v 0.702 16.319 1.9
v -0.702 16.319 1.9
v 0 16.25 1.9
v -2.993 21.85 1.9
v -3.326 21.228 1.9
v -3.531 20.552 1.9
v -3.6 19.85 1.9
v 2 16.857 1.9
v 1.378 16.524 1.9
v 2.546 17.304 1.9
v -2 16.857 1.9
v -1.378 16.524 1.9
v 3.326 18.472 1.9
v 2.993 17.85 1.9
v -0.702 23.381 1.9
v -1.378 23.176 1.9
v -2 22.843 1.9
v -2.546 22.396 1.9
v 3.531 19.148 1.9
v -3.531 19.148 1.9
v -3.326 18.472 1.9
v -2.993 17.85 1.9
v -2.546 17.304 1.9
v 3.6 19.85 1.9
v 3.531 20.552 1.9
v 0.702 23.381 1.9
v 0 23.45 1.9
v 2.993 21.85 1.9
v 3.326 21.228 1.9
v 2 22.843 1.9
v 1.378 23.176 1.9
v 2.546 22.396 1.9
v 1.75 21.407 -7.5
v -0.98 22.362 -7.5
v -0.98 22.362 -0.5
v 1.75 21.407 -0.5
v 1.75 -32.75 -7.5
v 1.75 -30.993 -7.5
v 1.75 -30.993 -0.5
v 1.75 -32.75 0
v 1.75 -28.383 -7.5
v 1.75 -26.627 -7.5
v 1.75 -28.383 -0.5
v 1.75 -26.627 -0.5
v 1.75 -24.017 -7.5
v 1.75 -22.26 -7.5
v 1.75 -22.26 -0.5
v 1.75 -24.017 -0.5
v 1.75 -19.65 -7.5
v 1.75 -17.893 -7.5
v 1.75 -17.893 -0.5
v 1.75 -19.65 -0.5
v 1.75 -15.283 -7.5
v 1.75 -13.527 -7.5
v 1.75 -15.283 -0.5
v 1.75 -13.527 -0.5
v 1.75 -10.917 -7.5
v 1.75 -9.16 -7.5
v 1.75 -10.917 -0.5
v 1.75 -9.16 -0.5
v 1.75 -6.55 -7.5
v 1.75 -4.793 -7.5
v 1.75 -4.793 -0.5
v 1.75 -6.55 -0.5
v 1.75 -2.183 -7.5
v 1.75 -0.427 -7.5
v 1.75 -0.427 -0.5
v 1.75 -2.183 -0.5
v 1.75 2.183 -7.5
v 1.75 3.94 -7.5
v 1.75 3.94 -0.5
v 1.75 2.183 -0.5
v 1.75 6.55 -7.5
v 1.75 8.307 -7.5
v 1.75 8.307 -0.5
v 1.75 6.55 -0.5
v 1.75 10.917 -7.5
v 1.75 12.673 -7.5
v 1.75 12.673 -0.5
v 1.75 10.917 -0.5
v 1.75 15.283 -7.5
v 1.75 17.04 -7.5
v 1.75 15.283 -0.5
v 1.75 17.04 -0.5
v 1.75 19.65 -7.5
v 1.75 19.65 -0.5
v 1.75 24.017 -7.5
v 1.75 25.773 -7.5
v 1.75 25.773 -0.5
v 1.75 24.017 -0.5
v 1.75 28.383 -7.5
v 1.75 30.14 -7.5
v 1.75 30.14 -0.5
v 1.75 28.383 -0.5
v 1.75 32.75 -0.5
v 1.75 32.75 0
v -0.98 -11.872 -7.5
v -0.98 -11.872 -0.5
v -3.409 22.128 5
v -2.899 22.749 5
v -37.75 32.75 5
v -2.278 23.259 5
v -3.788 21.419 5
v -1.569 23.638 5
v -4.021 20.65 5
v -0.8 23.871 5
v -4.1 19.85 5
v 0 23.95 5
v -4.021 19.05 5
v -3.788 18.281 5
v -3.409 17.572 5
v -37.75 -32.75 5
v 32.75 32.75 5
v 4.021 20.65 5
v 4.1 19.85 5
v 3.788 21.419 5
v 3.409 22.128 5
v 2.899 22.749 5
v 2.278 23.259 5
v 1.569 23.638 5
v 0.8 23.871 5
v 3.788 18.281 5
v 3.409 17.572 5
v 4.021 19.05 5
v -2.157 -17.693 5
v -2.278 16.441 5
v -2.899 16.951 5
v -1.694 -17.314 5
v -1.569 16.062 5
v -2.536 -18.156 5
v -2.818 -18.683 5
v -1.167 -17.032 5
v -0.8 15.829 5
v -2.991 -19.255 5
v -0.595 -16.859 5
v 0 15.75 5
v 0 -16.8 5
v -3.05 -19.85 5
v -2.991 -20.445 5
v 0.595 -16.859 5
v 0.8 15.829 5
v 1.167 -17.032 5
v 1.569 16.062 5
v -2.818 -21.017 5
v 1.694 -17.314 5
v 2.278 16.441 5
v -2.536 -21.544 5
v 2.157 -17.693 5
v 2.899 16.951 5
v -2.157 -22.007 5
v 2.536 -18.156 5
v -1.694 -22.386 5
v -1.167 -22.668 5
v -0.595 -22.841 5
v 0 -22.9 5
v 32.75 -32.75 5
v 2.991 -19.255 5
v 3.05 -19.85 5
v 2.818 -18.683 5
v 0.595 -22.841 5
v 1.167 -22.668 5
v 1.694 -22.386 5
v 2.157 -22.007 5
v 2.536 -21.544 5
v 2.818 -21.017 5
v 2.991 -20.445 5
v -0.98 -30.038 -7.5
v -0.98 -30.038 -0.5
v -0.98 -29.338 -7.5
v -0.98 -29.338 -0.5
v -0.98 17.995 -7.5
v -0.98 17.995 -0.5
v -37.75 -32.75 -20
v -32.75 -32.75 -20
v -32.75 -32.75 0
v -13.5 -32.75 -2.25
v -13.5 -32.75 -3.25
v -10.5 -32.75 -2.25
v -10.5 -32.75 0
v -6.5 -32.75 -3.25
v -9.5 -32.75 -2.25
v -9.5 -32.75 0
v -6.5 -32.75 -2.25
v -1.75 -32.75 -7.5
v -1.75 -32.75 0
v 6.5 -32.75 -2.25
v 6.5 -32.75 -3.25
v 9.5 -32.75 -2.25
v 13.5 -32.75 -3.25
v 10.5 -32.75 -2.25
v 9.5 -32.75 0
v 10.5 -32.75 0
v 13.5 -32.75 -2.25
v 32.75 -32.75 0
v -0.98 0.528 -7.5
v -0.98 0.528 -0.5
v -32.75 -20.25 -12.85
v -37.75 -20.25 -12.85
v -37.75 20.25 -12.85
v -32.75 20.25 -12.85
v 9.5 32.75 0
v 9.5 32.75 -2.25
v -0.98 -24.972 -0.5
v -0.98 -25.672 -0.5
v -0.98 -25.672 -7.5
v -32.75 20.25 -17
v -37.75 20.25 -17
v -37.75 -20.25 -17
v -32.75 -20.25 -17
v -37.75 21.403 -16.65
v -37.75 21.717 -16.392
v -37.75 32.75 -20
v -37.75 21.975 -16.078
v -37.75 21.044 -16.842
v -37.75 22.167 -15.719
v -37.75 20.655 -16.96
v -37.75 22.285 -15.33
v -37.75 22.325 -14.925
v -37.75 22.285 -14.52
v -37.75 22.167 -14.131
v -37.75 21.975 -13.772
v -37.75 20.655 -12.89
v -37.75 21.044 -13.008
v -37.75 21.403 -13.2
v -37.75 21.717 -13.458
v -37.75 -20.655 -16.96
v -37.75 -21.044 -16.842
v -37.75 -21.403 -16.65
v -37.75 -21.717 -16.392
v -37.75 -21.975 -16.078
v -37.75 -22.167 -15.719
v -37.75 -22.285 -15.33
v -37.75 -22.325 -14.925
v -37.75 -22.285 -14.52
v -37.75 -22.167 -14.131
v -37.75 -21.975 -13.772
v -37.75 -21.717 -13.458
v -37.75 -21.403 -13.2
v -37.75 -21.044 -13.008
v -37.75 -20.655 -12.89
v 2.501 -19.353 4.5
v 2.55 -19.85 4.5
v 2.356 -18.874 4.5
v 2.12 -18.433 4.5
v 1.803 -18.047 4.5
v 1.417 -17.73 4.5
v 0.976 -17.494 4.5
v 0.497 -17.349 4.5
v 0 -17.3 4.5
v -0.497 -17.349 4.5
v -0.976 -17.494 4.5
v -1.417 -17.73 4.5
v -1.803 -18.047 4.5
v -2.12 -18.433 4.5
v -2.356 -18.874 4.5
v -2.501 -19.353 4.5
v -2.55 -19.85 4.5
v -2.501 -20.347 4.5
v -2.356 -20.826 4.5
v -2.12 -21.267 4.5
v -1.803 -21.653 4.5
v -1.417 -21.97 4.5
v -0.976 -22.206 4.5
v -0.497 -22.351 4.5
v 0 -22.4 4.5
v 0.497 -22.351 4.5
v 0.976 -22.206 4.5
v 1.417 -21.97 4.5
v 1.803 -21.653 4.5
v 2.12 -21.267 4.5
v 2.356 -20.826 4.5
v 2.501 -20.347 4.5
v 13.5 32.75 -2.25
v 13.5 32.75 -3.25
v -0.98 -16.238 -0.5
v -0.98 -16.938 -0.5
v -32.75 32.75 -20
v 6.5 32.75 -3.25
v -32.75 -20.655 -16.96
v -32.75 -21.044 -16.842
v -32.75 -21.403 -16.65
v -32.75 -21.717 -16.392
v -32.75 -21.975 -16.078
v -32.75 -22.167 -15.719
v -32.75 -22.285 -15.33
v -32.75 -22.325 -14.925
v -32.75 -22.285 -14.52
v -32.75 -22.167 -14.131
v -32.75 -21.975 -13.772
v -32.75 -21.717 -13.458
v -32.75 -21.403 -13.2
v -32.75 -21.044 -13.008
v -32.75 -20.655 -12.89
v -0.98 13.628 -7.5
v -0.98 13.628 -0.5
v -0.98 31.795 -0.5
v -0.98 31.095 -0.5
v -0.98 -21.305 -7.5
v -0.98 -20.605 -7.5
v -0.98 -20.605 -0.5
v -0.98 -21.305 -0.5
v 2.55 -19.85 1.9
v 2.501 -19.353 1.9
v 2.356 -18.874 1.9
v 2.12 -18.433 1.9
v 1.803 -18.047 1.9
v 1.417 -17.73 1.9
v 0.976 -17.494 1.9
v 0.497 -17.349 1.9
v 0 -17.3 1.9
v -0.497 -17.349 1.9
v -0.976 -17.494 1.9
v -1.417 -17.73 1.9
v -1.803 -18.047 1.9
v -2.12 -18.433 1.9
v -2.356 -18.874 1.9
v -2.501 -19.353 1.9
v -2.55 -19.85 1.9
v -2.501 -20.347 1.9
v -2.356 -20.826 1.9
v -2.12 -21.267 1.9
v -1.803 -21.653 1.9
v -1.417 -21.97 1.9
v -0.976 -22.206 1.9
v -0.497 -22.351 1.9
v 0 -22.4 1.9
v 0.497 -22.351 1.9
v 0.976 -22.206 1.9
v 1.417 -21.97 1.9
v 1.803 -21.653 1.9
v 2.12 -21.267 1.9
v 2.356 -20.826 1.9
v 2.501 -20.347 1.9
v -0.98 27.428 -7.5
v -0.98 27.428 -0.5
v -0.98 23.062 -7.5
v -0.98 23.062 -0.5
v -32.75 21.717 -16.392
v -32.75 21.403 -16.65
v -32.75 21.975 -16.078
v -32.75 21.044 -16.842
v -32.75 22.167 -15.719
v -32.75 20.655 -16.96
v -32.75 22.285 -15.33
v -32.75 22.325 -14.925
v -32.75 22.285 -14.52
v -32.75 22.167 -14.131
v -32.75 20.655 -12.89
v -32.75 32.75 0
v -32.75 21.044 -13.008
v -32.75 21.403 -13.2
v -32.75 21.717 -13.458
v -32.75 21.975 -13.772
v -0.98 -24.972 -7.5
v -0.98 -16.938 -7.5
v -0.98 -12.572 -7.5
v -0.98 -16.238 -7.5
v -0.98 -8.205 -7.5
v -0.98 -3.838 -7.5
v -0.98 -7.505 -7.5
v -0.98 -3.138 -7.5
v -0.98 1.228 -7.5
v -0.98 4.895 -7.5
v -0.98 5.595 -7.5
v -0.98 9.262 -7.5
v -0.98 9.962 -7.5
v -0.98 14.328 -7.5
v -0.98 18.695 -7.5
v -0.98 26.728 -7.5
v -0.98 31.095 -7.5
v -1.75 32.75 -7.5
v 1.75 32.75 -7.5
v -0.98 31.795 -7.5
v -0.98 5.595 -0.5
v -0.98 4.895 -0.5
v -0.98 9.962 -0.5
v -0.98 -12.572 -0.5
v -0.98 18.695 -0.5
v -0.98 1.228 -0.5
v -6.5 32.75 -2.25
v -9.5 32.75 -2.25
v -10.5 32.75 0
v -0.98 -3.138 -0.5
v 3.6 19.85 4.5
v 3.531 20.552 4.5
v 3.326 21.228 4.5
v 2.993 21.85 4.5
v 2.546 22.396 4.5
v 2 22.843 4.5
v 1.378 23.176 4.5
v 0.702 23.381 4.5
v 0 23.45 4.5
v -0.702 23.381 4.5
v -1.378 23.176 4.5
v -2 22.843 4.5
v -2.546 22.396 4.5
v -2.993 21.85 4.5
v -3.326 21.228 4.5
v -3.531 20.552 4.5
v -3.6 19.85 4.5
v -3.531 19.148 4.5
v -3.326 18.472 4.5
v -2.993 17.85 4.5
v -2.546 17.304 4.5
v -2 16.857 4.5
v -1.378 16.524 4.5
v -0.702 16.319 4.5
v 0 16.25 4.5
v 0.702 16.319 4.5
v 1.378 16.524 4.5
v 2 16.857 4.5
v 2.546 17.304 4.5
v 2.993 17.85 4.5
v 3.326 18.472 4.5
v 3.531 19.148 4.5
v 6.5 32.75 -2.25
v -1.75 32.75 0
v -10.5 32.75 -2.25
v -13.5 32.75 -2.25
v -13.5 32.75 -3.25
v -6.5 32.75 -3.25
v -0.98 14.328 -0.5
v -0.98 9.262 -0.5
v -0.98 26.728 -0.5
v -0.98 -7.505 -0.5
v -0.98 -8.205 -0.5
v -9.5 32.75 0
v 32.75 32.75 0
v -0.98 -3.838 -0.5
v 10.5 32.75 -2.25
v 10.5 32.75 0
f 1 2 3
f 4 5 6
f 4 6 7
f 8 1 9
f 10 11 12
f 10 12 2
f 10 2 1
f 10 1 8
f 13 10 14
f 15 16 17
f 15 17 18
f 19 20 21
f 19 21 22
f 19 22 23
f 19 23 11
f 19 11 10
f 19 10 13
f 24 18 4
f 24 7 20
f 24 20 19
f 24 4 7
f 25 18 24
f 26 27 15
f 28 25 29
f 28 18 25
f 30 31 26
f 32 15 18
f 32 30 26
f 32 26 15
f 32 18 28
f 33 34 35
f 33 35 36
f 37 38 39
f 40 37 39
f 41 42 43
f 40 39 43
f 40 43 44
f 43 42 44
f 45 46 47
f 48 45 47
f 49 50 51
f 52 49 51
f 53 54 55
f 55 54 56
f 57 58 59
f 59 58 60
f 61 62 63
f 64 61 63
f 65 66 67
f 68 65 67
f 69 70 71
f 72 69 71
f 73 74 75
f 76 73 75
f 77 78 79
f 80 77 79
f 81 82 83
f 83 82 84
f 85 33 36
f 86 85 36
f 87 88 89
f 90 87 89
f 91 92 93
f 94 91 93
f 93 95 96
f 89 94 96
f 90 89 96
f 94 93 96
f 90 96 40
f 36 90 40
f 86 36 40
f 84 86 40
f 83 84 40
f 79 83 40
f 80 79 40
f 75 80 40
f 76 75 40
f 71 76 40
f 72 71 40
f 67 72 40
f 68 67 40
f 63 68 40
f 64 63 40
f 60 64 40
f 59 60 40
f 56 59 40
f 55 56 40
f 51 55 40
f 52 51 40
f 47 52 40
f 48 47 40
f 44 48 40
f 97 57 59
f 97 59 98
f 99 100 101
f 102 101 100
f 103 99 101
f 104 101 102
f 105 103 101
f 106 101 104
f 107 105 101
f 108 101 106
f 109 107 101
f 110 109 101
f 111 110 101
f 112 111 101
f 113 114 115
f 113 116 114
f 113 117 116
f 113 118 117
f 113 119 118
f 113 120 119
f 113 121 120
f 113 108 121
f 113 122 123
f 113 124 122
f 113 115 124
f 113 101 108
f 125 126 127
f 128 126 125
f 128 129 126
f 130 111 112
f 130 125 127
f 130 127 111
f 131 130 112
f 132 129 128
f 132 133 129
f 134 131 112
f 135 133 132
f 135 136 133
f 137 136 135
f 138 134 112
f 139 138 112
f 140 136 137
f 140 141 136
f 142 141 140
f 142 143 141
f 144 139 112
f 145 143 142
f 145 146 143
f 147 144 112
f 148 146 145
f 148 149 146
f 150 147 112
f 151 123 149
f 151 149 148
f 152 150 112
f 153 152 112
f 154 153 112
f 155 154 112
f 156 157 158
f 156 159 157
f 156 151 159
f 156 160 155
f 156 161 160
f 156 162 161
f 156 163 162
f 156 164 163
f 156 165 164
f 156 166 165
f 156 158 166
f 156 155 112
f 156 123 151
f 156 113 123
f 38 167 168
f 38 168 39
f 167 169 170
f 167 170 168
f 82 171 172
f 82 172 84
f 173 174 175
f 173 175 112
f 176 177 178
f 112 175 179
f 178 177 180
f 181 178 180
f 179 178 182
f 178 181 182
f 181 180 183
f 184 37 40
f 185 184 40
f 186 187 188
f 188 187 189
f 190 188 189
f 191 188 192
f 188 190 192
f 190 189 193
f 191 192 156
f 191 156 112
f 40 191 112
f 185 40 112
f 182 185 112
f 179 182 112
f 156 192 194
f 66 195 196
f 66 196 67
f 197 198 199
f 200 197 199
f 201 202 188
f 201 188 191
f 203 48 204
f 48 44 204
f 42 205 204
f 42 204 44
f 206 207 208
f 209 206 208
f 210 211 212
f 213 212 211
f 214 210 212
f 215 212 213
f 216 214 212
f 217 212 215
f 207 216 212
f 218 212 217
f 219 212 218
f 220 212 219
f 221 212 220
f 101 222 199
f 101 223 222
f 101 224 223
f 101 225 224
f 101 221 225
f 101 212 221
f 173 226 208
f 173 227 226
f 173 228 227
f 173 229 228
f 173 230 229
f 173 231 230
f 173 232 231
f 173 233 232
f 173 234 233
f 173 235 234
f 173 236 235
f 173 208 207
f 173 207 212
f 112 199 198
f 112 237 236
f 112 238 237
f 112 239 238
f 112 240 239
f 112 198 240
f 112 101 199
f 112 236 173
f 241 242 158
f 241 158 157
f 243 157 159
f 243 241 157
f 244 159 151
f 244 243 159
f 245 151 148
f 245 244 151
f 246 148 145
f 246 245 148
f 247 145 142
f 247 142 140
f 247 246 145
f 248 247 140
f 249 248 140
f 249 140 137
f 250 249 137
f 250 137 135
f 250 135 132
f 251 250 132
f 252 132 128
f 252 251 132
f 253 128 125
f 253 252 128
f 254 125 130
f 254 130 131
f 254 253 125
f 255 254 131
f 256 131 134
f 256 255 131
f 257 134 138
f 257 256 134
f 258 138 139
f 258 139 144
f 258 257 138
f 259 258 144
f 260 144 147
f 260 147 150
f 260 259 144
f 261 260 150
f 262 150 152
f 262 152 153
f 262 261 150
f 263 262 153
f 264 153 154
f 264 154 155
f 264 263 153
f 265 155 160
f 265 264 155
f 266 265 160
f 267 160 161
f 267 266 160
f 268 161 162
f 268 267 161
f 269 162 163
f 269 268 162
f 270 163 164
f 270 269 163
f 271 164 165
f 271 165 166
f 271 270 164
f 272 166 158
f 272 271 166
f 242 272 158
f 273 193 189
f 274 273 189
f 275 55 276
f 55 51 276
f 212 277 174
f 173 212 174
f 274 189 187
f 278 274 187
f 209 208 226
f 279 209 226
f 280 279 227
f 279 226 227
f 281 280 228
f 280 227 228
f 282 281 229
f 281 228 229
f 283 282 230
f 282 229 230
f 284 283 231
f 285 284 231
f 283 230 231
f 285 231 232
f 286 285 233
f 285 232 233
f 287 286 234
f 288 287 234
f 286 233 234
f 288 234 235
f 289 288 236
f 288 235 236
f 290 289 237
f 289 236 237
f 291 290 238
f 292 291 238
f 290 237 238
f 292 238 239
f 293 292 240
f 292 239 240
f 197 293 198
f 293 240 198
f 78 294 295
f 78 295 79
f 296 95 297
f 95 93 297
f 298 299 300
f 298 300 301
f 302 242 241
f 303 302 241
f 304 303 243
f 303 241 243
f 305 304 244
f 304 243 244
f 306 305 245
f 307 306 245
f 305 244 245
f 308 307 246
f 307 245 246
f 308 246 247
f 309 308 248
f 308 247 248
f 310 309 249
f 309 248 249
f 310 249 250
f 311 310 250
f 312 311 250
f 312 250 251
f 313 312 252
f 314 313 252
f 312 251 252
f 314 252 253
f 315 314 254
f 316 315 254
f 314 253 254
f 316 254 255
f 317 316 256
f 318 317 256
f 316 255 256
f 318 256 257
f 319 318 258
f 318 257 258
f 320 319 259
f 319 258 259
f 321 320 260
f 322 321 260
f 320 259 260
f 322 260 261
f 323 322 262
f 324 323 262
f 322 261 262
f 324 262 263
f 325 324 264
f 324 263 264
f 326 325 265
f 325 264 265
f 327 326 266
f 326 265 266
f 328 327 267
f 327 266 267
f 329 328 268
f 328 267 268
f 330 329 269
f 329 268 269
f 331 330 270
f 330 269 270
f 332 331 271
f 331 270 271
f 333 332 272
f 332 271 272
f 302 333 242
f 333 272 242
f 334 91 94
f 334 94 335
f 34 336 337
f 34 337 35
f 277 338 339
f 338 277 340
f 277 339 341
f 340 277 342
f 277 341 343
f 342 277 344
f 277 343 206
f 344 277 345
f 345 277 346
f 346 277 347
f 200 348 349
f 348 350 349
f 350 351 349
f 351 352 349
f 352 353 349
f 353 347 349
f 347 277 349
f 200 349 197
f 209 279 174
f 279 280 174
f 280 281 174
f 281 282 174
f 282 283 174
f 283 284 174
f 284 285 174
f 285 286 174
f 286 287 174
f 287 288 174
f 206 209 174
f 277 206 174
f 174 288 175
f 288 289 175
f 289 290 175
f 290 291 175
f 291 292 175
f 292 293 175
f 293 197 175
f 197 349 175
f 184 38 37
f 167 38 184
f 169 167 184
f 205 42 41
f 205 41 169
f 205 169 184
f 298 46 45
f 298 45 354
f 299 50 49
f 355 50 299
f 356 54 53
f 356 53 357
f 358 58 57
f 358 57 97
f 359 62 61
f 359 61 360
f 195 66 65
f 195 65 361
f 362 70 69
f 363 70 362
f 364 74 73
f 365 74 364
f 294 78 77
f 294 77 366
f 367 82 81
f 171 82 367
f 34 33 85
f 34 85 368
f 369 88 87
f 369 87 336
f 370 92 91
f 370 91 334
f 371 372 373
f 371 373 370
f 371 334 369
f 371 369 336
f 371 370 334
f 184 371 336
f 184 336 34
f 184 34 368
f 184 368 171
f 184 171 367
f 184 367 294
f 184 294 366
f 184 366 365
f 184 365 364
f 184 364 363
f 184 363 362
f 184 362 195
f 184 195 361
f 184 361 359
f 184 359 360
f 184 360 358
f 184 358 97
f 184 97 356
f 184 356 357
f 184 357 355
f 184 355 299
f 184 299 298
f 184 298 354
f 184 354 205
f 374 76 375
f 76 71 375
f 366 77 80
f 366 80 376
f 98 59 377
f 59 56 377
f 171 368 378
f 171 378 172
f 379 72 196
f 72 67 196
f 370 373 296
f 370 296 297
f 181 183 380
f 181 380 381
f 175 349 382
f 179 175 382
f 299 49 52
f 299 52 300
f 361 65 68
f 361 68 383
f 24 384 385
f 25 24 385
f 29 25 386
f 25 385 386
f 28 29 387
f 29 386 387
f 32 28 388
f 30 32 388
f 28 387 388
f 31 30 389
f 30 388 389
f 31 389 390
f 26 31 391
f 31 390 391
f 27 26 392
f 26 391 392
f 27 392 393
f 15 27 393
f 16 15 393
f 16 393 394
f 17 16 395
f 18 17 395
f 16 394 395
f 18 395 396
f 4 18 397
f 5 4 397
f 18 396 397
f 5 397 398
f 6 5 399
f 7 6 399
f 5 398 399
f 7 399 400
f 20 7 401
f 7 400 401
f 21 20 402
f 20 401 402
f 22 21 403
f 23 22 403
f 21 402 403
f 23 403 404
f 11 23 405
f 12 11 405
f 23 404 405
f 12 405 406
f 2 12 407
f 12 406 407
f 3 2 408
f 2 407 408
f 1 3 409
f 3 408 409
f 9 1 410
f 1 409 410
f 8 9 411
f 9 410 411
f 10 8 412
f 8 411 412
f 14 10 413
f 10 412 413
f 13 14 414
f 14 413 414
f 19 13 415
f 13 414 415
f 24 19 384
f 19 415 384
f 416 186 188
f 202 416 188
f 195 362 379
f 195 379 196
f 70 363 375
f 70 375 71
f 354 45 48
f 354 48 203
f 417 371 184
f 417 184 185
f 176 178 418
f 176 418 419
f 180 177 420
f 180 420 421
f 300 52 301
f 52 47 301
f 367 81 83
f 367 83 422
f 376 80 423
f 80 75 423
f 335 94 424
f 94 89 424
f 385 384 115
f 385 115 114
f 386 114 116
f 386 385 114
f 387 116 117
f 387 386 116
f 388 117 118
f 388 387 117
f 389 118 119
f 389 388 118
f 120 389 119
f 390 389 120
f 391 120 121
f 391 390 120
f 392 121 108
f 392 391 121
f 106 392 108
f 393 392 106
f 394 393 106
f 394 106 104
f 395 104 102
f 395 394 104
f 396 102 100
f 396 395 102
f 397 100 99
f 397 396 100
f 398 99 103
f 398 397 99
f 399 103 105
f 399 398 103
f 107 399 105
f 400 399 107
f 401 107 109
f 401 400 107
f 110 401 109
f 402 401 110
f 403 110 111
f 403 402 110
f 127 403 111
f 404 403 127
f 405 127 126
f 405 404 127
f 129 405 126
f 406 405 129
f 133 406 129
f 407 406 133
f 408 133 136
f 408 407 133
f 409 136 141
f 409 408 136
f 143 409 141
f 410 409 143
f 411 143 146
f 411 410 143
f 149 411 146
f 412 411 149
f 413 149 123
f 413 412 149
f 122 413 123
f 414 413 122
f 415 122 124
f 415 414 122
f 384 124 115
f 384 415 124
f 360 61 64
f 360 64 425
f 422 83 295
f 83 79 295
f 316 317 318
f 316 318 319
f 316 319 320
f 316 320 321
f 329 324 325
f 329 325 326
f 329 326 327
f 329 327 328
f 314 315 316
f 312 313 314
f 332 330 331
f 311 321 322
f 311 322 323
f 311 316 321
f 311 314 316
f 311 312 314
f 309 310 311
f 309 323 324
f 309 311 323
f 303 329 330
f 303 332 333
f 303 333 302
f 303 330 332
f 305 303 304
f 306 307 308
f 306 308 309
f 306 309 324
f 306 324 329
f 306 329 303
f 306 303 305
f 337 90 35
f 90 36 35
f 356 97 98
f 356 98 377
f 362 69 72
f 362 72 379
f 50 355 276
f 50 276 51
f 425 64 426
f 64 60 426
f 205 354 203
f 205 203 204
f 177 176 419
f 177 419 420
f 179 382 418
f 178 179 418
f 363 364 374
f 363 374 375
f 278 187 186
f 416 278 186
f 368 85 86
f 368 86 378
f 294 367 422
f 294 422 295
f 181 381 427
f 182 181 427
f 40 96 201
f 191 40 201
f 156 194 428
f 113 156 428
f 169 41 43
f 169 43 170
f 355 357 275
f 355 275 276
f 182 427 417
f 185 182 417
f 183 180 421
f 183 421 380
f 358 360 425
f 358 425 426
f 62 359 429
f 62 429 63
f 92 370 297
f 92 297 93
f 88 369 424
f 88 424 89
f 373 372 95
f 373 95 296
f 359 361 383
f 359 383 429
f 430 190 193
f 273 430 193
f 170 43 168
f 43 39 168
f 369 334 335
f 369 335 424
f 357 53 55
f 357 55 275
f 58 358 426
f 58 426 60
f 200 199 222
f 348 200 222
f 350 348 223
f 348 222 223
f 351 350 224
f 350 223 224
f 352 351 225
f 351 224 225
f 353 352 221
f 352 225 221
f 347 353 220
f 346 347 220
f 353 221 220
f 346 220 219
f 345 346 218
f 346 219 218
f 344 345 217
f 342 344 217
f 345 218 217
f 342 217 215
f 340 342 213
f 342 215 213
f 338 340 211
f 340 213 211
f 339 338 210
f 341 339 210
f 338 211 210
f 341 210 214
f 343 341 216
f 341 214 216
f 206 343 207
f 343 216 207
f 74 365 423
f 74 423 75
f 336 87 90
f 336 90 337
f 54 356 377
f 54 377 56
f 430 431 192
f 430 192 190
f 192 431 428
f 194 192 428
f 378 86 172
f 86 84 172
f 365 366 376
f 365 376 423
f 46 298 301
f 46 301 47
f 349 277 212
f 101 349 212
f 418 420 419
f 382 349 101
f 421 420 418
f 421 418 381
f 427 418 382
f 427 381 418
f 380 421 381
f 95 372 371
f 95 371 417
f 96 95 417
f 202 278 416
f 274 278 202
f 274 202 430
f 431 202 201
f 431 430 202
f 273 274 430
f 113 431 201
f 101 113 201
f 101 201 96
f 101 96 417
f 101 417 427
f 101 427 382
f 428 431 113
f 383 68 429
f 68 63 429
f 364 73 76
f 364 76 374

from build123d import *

# Parameters (mm, degrees)
SKETCH_W            = 65.5
SKETCH_H            = 65.5
PAD_DEPTH           = 5
PAD001_DEPTH        = 65.5
SKETCH002_W         = 3.5
SKETCH002_H         = 8
PAD002_DEPTH        = 65.5
POCKET_DEPTH        = 7
LINEARPATTERN_COUNT = 16
LINEARPATTERN_PITCH = 4.366667
SKETCH005_W         = 65.5
SKETCH005_H         = 25
PAD003_DEPTH        = 5
POCKET001_DEPTH     = 5
SKETCH007_R         = 3.6
SKETCH007_R_2       = 2.55
POCKET002_DEPTH     = 3.1
CHAMFER_SIZE        = 0.5


with BuildPart() as part:
    # Sketch → Pad (new body)
    with BuildSketch(Plane.XY):
        Rectangle(SKETCH_W, SKETCH_H)
    extrude(amount=PAD_DEPTH)

    # Sketch001 (on Face3 of Pad) → Pad001 (join)
    with BuildSketch(Plane.XZ.offset(32.75)):
        Polygon((-10.5, 0.5), (-10.5, -2.25), (-13.5, -2.25), (-13.5, -3.25), (-6.5, -3.25), (-6.5, -2.25), (-9.5, -2.25), (-9.5, 0.5), align=None)
        Polygon((9.5, 0.5), (10.5, 0.5), (10.5, -2.25), (13.5, -2.25), (13.5, -3.25), (6.5, -3.25), (6.5, -2.25), (9.5, -2.25), align=None)
    extrude(amount=-PAD001_DEPTH)

    # Sketch002 (on Face1 of Pad001) → Pad002 (join)
    with BuildSketch(Plane(origin=(0, 32.75, 0), x_dir=(-1, 0, 0), z_dir=(0, 1, 0))):
        with Locations((0, -3.5)):
            Rectangle(SKETCH002_W, SKETCH002_H)
    extrude(amount=-PAD002_DEPTH)

    # Sketch003 (on Face32 of Pad002) → Pocket (cut)
    with BuildSketch(Plane(origin=(0, 0, -7.5), x_dir=(1, 0, 0), z_dir=(0, 0, -1))):
        Polygon((1.75, -32.75), (-0.98, -31.795), (-0.98, -31.095), (1.75, -30.14), align=None)
    pocket = extrude(amount=-POCKET_DEPTH, mode=Mode.SUBTRACT)

    # LinearPattern: Pocket ×16
    with Locations(*[(0, -i * LINEARPATTERN_PITCH, 0) for i in range(1, LINEARPATTERN_COUNT)]):
        add(pocket, mode=Mode.SUBTRACT)

    # Sketch005 (on Face11 of LinearPattern) → Pad003 (join)
    with BuildSketch(Plane(origin=(-32.75, 0, 0), x_dir=(0, -1, 0), z_dir=(-1, 0, 0))):
        with Locations((0, -7.5)):
            Rectangle(SKETCH005_W, SKETCH005_H)
    extrude(amount=PAD003_DEPTH)

    # Sketch006 (on Face25 of Pad003) → Pocket001 (cut)
    with BuildSketch(Plane(origin=(-37.75, 0, 0), x_dir=(0, -1, 0), z_dir=(-1, 0, 0))):
        with BuildLine():
            ThreePointArc((-20.25, -12.85), (-22.325, -14.925), (-20.25, -17))
            Line((-20.25, -17), (20.25, -17))
            ThreePointArc((20.25, -17), (22.325, -14.925), (20.25, -12.85))
            Line((20.25, -12.85), (-20.25, -12.85))
        make_face()
    extrude(amount=-POCKET001_DEPTH, mode=Mode.SUBTRACT)

    # Sketch007 (on Face10 of Pocket001) → Pocket002 (cut)
    with BuildSketch(Plane.XY.offset(5)):
        with Locations((0, 19.85)):
            Circle(SKETCH007_R)
        with Locations((0, -19.85)):
            Circle(SKETCH007_R_2)
    extrude(amount=-POCKET002_DEPTH, mode=Mode.SUBTRACT)

    # Chamfer
    chamfer_edges = [part.edges().sort_by_distance(p)[0] for p in [
        (-2.55, -19.85, 5),
        (-3.6, 19.85, 5),
    ]]
    chamfer(chamfer_edges, length=CHAMFER_SIZE)


solid = part.part
